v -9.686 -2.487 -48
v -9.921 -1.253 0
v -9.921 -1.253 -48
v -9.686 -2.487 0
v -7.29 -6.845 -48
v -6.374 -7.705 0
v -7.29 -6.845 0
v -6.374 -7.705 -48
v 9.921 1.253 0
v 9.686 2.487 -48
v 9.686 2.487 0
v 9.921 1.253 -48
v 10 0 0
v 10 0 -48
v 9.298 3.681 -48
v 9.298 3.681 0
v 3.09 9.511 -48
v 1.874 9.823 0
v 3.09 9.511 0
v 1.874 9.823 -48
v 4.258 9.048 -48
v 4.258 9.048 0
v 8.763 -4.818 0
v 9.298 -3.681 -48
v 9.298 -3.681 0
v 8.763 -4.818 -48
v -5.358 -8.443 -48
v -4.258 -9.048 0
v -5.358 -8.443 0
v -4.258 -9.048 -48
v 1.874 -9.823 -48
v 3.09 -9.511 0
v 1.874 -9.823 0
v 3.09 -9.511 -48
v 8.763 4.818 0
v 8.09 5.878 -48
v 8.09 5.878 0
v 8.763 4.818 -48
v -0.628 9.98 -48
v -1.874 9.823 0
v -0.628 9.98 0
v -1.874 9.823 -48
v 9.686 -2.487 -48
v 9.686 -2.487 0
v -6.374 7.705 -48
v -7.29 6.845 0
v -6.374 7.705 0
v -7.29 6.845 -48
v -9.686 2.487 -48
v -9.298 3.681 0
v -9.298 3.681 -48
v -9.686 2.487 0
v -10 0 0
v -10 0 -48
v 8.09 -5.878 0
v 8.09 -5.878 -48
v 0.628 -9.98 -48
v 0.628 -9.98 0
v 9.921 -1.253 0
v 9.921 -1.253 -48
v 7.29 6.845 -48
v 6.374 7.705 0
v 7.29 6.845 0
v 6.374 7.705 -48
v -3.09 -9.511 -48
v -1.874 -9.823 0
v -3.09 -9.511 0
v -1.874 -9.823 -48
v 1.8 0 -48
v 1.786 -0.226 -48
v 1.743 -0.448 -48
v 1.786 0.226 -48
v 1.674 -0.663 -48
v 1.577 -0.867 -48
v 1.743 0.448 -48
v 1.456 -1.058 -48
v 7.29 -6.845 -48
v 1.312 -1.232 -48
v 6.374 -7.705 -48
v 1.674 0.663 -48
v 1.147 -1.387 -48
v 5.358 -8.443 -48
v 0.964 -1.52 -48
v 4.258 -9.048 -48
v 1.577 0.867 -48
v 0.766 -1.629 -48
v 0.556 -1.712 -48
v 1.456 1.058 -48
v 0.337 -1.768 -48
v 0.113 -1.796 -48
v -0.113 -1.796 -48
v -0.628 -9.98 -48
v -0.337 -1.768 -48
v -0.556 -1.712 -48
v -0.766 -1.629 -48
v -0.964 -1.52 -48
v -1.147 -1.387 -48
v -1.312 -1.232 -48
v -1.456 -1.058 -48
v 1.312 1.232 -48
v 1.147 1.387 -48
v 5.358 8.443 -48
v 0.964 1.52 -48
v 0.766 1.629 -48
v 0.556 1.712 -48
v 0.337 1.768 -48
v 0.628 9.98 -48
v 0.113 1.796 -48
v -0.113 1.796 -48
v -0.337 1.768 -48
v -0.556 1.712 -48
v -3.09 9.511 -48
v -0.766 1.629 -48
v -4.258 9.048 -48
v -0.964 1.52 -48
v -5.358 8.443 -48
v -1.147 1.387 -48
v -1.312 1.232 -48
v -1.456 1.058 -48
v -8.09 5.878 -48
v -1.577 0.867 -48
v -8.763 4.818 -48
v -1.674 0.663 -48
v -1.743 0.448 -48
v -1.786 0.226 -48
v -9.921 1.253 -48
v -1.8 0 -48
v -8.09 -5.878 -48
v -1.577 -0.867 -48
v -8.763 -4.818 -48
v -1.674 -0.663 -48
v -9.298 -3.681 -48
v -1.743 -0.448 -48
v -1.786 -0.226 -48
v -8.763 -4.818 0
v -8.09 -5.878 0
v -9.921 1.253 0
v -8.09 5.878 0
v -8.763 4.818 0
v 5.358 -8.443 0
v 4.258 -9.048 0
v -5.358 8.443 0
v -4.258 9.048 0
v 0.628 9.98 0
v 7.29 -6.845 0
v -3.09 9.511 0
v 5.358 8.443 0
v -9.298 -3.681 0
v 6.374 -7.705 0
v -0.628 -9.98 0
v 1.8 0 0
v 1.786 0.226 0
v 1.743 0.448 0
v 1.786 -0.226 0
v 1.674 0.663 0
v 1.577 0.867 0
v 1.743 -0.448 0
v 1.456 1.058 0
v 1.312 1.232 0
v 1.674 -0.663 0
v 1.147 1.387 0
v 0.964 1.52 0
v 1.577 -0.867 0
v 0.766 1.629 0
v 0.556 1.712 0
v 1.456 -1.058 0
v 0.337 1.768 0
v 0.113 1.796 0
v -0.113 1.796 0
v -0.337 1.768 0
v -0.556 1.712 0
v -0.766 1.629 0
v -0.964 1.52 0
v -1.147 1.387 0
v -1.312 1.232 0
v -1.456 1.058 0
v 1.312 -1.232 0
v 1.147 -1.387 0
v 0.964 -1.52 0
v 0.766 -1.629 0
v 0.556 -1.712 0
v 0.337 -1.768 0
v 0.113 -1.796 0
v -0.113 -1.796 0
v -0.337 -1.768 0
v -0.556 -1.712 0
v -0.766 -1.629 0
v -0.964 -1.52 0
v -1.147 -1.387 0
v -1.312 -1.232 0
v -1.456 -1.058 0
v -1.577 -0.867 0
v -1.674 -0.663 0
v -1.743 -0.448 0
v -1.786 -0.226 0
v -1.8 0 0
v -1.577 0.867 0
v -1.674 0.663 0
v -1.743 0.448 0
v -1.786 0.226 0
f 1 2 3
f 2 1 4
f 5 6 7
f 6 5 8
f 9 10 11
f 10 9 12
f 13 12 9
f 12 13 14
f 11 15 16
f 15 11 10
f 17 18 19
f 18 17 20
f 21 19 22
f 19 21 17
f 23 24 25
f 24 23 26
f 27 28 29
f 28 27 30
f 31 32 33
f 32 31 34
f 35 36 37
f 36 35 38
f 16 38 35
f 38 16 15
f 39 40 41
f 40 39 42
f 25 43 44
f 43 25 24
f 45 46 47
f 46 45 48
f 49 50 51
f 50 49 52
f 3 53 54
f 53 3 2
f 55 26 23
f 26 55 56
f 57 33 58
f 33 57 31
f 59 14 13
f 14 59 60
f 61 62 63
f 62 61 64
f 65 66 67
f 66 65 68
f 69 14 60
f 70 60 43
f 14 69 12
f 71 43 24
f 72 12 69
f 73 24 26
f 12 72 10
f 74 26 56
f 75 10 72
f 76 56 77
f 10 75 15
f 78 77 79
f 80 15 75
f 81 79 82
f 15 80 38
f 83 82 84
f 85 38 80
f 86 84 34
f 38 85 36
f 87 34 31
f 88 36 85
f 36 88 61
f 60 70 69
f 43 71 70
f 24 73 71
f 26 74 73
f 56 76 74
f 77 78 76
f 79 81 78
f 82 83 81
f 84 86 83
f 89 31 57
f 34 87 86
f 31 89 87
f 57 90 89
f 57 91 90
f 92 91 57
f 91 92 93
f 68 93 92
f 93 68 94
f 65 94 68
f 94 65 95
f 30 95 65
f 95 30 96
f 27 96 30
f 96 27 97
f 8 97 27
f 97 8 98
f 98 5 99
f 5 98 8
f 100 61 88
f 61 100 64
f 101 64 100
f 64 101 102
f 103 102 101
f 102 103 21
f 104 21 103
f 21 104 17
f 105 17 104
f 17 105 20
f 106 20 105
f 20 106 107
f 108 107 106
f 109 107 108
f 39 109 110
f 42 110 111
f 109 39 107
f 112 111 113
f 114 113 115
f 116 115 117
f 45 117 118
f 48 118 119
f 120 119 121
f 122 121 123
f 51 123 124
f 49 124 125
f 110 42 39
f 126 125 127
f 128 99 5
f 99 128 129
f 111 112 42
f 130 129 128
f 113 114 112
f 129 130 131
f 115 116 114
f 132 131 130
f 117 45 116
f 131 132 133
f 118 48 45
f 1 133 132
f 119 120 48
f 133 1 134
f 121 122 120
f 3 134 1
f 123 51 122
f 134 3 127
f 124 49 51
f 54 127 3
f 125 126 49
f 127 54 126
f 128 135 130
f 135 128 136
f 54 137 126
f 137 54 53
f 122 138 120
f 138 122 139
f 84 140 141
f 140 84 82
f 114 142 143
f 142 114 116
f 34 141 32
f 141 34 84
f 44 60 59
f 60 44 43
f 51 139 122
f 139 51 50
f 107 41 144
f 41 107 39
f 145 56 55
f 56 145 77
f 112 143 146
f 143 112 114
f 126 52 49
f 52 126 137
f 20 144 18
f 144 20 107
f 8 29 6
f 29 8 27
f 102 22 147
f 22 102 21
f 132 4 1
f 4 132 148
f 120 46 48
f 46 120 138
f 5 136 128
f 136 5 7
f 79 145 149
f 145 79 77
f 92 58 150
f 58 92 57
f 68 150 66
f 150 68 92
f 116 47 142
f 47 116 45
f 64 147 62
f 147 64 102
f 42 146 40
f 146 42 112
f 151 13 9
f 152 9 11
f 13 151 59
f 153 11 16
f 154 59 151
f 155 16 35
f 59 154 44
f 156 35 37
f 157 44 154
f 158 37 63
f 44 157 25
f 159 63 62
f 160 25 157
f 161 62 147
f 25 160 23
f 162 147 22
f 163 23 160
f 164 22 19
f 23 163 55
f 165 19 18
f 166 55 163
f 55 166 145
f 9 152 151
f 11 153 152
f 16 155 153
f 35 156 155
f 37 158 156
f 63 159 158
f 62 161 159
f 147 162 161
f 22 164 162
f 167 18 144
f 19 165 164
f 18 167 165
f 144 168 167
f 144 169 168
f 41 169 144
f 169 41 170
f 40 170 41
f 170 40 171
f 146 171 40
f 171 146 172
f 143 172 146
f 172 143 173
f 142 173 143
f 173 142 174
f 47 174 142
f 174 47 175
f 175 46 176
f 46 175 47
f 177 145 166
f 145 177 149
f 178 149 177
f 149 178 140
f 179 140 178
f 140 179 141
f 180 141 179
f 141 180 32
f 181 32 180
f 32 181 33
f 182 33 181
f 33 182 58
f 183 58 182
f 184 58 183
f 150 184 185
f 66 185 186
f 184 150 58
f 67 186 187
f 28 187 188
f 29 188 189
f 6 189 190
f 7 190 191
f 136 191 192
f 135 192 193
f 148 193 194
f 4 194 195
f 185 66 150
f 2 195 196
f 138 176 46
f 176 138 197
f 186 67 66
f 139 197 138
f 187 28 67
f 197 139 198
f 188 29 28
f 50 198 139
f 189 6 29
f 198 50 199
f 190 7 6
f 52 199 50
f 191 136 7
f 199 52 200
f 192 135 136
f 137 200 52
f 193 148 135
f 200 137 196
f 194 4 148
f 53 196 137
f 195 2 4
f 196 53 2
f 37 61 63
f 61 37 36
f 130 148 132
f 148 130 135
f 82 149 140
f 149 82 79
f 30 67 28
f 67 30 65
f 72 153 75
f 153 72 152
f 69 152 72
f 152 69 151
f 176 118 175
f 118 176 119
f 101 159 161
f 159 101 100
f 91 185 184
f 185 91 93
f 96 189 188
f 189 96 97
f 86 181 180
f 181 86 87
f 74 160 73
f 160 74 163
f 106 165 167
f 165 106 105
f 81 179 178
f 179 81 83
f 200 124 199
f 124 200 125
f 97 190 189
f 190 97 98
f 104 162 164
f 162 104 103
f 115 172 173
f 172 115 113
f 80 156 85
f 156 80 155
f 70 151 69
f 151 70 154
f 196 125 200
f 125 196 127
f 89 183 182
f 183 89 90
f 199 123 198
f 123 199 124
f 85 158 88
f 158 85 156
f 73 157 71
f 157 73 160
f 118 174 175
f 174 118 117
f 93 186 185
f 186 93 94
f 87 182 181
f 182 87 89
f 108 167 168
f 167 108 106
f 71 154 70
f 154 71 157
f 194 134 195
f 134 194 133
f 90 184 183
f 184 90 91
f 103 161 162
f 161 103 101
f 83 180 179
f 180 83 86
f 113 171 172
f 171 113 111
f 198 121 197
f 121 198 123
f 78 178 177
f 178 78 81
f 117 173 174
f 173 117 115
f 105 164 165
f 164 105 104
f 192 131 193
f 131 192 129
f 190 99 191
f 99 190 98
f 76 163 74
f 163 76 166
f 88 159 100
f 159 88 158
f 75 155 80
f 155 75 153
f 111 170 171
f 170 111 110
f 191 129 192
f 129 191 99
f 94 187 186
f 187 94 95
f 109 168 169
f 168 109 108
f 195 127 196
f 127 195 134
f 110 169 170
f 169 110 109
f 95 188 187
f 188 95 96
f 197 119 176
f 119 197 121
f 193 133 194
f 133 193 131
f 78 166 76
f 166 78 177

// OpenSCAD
$fn = 50;


difference() {
	union() {
		translate(v = [0, 0, -48.0000000000]) {
			cylinder(h = 48, r = 10.0000000000);
		}
		cylinder(h = 0, r = 19.0000000000);
	}
	union() {
		#translate(v = [0, 0, -48]) {
			cylinder(h = 48, r = 1.8000000000);
		}
	}
}
